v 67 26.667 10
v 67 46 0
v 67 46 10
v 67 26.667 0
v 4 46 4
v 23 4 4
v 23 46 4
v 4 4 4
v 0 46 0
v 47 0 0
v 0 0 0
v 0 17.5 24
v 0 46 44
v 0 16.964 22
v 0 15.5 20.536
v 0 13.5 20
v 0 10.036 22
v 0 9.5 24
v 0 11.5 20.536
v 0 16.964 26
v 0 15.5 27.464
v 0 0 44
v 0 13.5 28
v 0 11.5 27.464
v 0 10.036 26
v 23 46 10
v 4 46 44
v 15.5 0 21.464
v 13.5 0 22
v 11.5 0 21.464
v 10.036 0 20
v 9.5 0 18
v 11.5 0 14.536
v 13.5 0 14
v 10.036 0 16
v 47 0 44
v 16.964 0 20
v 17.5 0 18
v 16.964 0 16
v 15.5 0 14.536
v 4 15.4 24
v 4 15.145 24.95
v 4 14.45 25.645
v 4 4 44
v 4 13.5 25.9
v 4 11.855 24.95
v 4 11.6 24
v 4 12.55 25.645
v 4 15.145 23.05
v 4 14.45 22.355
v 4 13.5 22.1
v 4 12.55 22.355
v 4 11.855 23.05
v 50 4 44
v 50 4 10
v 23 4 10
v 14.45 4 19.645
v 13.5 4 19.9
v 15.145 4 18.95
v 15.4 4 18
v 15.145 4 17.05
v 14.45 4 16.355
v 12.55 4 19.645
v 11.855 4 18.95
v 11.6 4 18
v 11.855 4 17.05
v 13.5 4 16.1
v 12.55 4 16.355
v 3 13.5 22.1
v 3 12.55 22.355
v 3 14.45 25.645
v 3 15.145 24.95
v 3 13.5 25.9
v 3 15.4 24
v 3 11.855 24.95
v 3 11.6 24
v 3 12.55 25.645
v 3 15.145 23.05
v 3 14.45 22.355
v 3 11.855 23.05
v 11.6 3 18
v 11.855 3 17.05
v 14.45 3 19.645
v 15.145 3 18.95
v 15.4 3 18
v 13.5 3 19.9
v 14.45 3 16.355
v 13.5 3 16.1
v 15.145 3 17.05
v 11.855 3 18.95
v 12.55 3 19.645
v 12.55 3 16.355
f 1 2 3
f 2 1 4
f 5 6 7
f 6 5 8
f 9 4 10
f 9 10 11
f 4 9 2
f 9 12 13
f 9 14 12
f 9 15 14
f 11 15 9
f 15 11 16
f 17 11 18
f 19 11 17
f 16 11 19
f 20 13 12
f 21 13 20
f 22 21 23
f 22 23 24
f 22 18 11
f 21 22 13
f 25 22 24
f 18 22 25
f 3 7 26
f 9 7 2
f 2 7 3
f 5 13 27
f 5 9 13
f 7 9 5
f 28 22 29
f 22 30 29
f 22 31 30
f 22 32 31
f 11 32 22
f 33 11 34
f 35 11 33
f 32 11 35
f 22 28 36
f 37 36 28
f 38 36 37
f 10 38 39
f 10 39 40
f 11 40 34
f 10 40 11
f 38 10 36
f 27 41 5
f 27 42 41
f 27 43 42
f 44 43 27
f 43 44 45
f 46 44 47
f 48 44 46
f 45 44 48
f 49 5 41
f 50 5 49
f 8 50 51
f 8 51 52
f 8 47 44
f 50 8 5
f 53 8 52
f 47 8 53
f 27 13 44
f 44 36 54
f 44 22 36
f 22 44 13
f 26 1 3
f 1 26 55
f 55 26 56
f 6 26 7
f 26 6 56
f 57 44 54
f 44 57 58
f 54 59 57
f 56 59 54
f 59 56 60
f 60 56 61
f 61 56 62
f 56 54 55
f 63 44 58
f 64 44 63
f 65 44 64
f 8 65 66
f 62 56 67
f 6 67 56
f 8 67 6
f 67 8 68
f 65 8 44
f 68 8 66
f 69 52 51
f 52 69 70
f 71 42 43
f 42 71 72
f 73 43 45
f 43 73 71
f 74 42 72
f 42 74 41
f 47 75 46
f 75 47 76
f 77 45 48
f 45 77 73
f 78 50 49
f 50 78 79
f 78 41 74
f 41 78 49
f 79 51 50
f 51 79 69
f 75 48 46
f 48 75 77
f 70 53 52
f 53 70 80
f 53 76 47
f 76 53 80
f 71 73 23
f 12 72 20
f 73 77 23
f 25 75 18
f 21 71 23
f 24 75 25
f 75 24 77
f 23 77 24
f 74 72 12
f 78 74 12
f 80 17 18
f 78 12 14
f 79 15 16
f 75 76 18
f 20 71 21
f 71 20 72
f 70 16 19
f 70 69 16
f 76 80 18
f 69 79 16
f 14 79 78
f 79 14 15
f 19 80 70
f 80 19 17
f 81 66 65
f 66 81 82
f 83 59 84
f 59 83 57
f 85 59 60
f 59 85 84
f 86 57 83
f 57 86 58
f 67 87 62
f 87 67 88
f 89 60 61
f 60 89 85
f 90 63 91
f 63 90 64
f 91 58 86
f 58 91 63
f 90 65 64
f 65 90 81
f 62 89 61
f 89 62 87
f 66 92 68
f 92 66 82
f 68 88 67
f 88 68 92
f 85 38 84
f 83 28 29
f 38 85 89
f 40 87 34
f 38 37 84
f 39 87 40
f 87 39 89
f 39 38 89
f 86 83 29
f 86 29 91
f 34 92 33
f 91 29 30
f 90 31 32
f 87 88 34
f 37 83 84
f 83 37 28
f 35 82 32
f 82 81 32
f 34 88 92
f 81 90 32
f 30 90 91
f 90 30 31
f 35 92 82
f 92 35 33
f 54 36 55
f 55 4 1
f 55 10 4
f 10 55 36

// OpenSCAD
difference(){
	union() {
		cube(size = [67, 46, 4]);
		translate(v = [0, 0, 4]) {
			cube(size = [4, 46, 40]);
		}
		translate(v = [23, 0, 4]) {
			cube(size = [44, 46, 6]);
		}
		translate(v = [0, 0, 4]) {
			cube(size = [67, 4, 40]);
		}
	}
	/* Holes Below*/
	union(){
		translate(v = [47, 0, 0]) {
			rotate(a = -36.8700000000, v = [0, 0, 1]) {
				cube(size = [50, 50, 50]);
			}
		}
		translate(v = [0, 13.5000000000, 24.0000000000]) {
			rotate(a = -90, v = [0, 1, 0]) {
				union() {
					union() {
						translate(v = [0, 0, -5]) {
							cylinder($fn = 12, h = 5, r = 1.9000000000);
						}
						translate(v = [0, 0, -3]) {
							cylinder($fn = 12, h = 3, r1 = 1.9000000000, r2 = 4);
						}
					}
					cylinder($fn = 12, h = 1, r = 4);
				}
			}
		}
		translate(v = [13.5000000000, 0, 18.0000000000]) {
			rotate(a = 90, v = [1, 0, 0]) {
				union() {
					union() {
						translate(v = [0, 0, -5]) {
							cylinder($fn = 12, h = 5, r = 1.9000000000);
						}
						translate(v = [0, 0, -3]) {
							cylinder($fn = 12, h = 3, r1 = 1.9000000000, r2 = 4);
						}
					}
					cylinder($fn = 12, h = 1, r = 4);
				}
			}
		}
	} /* End Holes */ 
}
